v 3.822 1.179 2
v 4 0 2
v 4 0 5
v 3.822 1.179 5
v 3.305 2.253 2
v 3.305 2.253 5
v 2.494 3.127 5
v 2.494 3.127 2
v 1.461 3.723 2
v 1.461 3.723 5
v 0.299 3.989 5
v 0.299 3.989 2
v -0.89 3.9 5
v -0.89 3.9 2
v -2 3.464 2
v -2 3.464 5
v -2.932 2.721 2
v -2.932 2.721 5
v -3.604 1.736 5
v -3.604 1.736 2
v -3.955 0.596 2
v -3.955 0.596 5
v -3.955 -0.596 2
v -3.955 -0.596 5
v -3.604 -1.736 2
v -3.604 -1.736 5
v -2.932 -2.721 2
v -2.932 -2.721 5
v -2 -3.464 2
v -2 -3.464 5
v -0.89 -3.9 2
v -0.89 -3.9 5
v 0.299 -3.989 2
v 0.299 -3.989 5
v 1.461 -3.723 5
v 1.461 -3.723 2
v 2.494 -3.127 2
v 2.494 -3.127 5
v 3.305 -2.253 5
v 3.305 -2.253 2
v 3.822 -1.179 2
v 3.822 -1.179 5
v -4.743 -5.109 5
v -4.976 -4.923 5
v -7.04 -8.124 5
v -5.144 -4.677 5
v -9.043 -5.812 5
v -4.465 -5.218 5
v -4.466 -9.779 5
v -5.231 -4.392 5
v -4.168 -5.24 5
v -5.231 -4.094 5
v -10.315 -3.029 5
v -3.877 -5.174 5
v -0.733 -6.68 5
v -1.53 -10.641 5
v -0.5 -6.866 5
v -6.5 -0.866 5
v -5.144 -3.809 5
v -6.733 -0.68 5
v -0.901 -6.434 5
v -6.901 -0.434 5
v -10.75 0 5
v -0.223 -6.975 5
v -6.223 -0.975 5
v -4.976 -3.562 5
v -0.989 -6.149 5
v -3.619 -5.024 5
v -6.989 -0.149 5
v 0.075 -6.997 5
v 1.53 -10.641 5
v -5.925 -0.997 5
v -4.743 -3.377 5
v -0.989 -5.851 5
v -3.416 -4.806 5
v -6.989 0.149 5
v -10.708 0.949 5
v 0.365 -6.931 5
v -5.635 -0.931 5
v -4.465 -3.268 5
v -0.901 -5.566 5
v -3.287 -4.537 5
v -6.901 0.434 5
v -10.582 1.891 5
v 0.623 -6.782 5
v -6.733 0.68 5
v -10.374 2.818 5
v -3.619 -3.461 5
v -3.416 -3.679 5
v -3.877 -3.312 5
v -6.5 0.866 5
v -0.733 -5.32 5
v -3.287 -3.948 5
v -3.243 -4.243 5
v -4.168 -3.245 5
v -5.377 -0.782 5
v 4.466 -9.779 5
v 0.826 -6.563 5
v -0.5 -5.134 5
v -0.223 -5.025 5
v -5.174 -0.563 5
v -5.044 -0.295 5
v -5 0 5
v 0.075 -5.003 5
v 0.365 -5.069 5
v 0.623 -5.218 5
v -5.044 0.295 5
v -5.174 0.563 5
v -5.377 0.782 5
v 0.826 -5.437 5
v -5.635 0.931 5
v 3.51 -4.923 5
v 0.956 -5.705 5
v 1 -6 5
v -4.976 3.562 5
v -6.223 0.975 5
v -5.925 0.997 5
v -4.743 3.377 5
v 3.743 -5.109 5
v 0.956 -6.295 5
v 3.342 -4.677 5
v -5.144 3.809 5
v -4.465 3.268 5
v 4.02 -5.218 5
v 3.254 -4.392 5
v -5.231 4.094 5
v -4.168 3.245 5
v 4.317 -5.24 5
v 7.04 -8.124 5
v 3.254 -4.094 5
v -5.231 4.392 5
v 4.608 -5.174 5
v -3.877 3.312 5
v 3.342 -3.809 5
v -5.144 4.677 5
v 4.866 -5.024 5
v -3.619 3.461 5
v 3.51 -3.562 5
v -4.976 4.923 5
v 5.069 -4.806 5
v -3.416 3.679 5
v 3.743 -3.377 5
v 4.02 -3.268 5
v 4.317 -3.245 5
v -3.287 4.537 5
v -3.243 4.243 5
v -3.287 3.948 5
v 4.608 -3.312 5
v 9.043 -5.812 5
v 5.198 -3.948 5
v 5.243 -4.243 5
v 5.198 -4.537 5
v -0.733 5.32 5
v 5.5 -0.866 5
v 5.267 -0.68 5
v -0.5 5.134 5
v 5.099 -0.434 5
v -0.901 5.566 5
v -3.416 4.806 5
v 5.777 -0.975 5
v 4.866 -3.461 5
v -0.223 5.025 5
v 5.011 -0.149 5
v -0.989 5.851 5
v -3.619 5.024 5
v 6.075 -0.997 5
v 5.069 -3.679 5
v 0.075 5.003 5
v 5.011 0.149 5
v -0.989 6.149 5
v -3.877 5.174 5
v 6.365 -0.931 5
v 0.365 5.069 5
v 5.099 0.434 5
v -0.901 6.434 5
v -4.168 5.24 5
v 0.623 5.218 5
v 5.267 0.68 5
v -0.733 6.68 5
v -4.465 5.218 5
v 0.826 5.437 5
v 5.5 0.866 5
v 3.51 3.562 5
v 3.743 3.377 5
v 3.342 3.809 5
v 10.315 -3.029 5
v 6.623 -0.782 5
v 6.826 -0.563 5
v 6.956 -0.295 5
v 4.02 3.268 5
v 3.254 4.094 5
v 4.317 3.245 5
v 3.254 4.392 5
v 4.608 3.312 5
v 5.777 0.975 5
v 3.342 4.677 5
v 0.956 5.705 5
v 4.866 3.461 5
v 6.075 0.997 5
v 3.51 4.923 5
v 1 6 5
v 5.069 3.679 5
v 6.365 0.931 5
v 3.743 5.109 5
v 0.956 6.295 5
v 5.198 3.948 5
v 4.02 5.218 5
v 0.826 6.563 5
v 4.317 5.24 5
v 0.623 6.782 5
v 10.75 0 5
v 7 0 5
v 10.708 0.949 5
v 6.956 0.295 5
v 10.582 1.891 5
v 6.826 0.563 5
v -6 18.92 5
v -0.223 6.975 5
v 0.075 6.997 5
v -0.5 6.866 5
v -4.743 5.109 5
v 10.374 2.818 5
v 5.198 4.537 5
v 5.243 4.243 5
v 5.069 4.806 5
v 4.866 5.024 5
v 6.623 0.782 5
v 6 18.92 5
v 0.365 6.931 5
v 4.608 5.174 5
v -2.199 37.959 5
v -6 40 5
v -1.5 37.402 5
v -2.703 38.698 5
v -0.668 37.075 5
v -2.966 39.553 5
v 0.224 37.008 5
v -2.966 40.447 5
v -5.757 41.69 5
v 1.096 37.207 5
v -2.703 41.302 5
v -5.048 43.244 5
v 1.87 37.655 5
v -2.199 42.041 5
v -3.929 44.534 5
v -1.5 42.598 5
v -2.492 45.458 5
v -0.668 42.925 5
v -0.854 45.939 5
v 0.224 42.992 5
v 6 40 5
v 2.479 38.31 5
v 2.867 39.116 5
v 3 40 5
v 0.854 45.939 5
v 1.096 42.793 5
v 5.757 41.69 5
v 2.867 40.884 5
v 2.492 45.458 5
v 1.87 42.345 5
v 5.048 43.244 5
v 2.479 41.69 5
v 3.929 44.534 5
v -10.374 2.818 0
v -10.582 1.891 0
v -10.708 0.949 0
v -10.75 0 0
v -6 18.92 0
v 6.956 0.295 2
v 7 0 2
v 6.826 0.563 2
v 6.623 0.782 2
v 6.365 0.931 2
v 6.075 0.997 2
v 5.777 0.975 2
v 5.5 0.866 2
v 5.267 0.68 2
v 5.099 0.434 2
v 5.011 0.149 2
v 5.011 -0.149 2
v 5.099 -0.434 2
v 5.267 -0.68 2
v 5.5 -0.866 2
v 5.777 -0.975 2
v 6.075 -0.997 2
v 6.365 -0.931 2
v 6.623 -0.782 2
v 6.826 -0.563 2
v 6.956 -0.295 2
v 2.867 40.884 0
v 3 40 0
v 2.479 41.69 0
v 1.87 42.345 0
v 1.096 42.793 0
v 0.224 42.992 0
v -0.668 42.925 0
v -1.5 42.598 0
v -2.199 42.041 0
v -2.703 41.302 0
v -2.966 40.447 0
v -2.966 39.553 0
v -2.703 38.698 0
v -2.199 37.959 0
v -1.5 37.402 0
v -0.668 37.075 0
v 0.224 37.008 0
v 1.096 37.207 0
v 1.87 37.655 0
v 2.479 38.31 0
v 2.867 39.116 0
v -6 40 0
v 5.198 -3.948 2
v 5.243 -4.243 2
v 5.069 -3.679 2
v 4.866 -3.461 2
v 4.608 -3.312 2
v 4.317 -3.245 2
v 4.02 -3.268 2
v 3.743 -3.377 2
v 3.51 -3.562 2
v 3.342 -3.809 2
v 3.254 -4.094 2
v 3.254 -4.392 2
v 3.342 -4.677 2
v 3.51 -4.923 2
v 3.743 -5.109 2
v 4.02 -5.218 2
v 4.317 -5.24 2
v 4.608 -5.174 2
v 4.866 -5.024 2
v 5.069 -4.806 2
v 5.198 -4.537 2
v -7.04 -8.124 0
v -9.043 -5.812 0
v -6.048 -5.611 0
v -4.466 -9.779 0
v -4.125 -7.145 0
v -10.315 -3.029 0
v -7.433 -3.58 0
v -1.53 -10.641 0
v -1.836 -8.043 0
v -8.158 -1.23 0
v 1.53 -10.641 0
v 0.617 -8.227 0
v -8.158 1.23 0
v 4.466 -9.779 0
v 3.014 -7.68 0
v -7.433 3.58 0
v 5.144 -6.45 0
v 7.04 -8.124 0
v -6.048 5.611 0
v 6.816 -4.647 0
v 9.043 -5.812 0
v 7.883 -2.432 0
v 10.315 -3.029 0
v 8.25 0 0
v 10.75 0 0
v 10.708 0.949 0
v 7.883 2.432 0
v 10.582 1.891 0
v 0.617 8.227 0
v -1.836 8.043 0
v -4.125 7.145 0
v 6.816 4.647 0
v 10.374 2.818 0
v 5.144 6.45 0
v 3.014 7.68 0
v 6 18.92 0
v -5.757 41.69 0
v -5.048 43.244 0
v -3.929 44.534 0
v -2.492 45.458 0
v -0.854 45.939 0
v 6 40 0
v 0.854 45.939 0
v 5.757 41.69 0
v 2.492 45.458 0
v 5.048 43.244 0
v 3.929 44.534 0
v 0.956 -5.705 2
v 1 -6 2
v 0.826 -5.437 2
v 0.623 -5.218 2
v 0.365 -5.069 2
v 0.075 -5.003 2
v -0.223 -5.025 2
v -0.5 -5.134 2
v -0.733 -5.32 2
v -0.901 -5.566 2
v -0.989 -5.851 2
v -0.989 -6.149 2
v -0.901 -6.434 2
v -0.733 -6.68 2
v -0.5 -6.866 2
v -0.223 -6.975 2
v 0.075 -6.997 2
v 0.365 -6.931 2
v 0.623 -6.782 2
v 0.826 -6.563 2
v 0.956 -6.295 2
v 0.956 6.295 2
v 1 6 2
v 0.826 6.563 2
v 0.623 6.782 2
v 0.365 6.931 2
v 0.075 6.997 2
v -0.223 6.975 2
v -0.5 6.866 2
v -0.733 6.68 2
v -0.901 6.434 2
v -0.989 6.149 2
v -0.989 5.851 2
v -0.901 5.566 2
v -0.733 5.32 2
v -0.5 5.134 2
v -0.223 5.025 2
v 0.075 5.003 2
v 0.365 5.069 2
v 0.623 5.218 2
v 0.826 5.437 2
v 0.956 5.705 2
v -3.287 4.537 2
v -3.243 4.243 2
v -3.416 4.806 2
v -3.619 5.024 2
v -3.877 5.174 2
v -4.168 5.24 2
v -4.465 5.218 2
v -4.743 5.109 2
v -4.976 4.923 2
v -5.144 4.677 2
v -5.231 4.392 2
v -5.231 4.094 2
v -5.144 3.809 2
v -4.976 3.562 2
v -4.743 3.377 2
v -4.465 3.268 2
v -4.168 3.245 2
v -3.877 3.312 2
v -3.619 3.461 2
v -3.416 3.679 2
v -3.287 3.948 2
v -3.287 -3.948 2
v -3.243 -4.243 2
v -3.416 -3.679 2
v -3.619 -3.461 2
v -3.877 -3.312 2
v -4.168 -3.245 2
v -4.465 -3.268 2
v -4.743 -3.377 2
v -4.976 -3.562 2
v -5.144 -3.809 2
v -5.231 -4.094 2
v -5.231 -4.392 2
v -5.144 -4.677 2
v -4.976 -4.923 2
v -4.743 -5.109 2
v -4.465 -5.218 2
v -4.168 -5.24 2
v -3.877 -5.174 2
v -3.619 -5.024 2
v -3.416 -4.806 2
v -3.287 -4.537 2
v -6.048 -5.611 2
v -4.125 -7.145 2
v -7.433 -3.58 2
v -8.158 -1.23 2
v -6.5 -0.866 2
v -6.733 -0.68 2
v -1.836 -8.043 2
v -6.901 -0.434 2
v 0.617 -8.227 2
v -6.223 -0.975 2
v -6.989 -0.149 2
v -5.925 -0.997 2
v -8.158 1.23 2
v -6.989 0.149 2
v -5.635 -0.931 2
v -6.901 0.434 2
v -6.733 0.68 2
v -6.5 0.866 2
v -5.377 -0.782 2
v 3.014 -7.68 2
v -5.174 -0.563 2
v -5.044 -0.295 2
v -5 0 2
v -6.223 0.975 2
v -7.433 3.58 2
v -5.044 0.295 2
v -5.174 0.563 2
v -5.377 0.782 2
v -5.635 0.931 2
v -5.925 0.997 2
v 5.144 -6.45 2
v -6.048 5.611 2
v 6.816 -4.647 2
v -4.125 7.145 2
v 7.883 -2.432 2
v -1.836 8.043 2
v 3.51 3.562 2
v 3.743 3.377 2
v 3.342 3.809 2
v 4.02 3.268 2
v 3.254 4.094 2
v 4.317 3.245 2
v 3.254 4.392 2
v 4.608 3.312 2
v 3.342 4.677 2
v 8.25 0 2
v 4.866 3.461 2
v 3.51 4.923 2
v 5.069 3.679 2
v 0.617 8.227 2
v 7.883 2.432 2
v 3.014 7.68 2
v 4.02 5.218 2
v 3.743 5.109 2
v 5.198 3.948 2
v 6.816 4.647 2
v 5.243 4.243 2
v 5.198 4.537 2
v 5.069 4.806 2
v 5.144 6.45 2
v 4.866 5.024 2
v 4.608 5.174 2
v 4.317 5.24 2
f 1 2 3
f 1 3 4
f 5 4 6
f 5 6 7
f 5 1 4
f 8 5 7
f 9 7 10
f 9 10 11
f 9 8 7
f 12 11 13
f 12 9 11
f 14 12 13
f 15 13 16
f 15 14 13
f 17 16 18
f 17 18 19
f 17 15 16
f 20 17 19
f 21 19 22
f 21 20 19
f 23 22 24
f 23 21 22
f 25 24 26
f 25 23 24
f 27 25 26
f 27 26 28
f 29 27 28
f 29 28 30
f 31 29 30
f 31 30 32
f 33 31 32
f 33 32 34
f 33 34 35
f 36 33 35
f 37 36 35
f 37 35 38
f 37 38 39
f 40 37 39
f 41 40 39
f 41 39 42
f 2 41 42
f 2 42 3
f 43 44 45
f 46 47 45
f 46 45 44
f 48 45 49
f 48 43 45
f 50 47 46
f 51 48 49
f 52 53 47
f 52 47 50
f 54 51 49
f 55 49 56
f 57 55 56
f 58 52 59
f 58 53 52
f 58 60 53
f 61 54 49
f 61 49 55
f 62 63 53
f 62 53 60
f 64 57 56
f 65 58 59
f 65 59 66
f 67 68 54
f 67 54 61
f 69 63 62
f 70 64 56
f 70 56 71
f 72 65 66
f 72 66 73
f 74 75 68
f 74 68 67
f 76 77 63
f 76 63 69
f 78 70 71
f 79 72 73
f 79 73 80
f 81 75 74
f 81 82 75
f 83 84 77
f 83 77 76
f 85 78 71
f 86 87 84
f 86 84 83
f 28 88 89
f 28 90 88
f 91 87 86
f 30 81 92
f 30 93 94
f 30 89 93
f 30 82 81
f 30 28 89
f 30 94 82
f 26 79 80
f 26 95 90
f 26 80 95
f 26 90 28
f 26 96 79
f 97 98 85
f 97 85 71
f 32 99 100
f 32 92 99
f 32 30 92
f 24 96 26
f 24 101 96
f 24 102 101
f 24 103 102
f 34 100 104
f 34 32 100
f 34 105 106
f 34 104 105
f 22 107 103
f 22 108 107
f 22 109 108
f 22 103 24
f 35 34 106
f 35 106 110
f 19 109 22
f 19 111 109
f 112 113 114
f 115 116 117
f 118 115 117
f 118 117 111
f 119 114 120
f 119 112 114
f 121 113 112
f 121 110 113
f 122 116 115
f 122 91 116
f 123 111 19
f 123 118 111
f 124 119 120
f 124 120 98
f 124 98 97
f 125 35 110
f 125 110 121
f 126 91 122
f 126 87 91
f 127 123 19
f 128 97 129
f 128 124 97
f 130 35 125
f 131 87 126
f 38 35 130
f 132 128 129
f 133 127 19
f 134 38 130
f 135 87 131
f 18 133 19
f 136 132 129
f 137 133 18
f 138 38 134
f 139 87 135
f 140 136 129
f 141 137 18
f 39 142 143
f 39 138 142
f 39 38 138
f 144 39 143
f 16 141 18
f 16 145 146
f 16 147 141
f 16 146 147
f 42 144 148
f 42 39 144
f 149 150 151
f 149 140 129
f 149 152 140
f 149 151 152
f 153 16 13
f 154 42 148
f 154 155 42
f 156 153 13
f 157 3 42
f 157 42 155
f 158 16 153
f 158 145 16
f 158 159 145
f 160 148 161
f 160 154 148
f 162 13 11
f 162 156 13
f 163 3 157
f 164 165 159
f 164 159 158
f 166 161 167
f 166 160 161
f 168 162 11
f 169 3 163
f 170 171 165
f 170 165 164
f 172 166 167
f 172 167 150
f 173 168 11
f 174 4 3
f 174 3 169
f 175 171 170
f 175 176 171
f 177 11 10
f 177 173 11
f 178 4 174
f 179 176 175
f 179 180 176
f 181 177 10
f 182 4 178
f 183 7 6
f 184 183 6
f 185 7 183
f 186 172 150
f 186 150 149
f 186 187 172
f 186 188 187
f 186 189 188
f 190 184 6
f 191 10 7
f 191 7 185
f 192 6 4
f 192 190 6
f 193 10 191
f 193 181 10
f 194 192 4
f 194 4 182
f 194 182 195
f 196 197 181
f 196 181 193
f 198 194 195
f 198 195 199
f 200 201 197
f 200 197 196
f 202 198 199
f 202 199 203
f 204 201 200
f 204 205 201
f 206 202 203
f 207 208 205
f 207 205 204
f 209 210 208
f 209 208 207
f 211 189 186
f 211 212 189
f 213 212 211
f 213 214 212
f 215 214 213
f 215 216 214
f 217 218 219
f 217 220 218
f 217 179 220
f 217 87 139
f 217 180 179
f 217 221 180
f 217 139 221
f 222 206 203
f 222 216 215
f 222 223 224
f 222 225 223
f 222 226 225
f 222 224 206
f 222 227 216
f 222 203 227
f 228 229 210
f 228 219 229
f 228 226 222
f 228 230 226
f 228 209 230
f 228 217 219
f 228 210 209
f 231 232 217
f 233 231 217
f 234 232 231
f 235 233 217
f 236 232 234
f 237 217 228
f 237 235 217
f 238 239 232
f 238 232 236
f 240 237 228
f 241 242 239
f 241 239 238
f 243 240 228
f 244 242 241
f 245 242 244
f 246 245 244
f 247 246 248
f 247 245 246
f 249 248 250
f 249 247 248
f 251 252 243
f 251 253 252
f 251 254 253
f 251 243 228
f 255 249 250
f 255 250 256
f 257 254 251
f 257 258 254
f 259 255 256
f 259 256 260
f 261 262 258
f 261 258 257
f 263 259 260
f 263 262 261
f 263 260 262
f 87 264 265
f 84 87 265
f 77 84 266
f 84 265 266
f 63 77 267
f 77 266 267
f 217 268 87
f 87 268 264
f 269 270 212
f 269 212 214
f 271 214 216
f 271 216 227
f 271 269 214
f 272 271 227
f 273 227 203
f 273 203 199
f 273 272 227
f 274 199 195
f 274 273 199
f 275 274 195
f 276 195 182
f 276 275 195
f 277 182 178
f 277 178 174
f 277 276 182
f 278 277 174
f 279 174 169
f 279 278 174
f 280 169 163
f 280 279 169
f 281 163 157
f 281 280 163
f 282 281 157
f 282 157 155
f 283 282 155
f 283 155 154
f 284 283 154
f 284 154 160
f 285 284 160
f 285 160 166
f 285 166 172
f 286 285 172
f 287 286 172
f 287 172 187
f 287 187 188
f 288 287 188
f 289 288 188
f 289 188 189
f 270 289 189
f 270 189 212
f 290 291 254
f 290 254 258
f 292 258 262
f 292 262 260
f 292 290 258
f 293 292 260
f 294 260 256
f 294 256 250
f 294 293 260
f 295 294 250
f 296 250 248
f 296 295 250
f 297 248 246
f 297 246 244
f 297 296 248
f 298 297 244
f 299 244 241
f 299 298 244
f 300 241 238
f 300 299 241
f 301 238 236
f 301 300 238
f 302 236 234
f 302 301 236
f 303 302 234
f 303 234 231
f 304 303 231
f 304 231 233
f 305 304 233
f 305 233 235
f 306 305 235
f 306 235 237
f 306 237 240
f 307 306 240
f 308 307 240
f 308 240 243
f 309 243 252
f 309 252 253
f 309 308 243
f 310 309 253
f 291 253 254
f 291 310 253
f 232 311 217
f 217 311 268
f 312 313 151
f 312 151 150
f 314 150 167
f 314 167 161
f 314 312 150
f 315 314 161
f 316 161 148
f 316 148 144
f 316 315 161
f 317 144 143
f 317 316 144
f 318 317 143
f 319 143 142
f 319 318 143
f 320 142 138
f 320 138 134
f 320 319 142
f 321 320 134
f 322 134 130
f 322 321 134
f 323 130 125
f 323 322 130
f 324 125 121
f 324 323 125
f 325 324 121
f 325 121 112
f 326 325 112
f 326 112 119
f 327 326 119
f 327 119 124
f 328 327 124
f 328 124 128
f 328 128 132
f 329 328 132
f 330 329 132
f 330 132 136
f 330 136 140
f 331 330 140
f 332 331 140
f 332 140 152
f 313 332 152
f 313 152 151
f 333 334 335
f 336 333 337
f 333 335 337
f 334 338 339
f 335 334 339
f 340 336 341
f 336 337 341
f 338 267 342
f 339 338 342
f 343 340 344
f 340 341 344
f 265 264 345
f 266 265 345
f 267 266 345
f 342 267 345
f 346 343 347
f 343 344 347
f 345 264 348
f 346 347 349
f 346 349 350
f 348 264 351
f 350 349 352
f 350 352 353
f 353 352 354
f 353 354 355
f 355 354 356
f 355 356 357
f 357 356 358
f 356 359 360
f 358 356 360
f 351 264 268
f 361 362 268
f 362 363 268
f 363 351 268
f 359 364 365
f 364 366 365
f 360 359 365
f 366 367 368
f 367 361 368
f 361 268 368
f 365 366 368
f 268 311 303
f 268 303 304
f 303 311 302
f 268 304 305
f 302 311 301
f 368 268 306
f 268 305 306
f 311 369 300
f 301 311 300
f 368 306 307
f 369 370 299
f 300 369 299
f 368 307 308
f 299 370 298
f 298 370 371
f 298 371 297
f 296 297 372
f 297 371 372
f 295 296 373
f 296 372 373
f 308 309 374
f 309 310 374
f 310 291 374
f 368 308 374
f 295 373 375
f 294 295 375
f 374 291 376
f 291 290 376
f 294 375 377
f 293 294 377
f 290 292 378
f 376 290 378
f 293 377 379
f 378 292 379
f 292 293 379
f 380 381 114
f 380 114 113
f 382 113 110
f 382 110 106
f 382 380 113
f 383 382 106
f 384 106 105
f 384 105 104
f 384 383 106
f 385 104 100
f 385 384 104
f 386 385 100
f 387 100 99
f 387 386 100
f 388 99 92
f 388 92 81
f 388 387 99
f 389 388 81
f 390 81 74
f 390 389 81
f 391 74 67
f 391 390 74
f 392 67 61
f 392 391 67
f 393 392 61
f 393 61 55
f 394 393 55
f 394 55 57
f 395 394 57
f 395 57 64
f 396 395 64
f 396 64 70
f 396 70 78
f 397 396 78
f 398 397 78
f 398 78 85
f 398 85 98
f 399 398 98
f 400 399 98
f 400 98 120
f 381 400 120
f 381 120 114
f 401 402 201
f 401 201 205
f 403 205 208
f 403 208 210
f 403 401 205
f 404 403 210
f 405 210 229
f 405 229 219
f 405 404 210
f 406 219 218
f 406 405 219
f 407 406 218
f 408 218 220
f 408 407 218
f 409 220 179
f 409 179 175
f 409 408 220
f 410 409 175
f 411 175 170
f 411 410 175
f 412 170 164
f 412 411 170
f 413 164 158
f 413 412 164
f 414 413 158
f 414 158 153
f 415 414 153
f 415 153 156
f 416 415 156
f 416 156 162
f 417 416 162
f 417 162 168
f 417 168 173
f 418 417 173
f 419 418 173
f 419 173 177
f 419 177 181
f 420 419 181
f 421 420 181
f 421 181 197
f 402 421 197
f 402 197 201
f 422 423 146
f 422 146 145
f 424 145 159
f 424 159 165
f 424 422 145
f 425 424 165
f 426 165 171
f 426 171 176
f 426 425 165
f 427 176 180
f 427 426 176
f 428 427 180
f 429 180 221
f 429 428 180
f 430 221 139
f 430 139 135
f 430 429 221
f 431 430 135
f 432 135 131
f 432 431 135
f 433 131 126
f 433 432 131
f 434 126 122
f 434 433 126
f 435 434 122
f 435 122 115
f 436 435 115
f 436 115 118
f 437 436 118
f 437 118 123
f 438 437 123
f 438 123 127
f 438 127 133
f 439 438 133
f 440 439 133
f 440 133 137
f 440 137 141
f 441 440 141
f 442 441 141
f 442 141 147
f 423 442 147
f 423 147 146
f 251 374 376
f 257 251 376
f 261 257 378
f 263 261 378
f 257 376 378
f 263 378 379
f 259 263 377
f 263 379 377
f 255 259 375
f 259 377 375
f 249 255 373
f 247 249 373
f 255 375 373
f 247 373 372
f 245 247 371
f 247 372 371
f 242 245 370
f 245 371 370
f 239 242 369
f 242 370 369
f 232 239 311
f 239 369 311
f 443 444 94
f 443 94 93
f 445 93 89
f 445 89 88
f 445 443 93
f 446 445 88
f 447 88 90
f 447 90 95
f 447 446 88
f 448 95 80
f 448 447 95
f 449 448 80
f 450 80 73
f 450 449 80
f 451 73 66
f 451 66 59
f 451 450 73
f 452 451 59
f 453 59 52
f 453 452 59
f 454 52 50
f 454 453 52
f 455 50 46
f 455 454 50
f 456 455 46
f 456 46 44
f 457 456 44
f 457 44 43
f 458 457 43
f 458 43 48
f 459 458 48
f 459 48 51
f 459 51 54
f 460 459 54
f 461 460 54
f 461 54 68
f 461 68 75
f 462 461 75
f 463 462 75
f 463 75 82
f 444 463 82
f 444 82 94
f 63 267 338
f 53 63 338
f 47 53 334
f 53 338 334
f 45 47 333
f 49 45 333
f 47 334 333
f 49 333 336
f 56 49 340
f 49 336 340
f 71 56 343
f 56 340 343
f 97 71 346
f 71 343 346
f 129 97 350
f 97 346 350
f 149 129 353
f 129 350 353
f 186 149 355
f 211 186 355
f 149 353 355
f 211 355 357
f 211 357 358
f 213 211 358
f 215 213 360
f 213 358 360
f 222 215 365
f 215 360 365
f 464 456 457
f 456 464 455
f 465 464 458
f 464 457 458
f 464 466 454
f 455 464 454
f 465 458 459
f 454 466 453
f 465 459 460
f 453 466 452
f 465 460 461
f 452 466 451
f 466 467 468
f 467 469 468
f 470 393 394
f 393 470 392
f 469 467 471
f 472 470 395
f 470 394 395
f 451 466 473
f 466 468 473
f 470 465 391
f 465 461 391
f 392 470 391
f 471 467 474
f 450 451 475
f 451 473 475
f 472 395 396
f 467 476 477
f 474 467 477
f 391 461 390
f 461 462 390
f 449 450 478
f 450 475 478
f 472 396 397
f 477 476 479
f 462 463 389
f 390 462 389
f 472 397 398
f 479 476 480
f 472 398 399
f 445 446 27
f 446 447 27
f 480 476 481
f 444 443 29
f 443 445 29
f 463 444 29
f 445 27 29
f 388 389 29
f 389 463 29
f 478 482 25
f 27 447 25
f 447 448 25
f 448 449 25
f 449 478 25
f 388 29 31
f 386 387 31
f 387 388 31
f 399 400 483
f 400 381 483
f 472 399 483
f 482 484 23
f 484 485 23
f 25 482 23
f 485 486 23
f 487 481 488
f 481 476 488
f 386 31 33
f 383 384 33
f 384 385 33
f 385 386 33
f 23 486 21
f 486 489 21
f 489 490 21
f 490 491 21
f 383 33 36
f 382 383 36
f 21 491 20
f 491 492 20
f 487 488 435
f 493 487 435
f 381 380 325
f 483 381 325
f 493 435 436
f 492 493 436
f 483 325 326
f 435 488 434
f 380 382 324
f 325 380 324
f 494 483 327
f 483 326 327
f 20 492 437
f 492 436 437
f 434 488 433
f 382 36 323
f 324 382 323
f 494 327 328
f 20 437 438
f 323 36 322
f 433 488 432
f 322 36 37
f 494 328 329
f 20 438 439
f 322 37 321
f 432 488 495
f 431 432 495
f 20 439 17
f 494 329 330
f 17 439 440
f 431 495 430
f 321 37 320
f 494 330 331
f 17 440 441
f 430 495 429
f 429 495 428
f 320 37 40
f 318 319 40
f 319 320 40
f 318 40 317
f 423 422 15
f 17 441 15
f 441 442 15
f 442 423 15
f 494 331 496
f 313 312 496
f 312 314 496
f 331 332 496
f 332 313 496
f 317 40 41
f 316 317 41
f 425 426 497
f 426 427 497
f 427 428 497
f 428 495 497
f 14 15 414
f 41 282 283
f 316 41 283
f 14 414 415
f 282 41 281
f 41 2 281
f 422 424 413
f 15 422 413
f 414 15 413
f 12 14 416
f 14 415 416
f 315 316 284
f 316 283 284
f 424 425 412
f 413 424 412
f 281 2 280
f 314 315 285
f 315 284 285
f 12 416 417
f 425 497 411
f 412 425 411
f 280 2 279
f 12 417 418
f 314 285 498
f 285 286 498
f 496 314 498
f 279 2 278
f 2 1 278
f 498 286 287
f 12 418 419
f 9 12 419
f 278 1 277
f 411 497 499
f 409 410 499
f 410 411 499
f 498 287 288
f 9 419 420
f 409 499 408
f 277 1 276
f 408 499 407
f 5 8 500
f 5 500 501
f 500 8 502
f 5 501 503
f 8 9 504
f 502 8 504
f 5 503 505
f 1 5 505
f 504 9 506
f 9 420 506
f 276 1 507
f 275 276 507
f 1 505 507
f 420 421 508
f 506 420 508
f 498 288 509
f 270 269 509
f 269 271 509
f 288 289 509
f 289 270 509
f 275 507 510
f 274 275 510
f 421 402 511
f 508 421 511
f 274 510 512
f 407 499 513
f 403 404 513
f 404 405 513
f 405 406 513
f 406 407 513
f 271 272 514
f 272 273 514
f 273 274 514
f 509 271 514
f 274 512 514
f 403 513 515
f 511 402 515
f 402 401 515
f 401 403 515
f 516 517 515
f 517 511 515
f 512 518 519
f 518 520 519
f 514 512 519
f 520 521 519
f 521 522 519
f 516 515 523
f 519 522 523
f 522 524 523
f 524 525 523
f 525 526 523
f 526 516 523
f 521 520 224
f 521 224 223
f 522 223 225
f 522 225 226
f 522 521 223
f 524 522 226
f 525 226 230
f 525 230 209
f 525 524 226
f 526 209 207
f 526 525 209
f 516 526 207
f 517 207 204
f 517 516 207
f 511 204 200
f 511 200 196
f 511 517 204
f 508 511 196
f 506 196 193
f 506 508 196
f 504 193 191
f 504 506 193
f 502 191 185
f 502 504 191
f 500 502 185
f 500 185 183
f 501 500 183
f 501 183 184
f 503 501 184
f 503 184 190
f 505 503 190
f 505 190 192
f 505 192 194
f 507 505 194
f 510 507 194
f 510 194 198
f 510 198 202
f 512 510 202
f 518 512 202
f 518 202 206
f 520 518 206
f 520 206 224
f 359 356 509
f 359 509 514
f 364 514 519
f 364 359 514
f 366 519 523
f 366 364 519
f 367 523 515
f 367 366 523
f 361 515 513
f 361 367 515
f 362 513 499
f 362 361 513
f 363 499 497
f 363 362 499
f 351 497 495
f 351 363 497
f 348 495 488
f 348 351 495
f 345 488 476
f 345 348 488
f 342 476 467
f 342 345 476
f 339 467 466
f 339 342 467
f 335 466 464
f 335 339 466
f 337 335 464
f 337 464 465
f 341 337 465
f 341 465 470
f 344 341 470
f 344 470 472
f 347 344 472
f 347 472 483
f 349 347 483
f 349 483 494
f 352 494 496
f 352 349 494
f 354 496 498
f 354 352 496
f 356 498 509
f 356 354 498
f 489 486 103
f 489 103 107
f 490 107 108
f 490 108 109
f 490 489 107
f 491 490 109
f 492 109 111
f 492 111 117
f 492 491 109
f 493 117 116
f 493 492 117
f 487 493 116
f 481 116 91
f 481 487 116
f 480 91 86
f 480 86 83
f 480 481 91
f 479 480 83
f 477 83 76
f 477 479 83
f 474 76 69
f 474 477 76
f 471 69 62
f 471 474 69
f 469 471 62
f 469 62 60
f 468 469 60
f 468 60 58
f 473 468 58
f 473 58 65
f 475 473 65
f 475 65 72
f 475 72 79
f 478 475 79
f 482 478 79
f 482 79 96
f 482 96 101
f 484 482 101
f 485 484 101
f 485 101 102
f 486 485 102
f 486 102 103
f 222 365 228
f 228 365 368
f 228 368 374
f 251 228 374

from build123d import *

# Parameters (mm, degrees)
F0_R     = 8.25
F0_R_2   = 3
F0_R_3   = 1
F0_R_4   = 4
F1_DEPTH = 5
F2_DEPTH = 2


with BuildPart() as f1:
    # F0 (on Top) → F1 (new body)
    with BuildSketch(Plane.XY):
        with BuildLine():
            Line((-6, 18.919781), (-6, 8.919781))
            ThreePointArc((-6, 8.919781), (-8.736982, 6.263198), (-10.374039, 2.818123))
            ThreePointArc((-10.374039, 2.818123), (-10.655595, 1.421545), (-10.75, 0))
            ThreePointArc((-10.75, 0), (0, -10.75), (10.75, 0))
            ThreePointArc((10.75, 0), (10.655595, 1.421545), (10.374039, 2.818123))
            ThreePointArc((10.374039, 2.818123), (8.736982, 6.263198), (6, 8.919781))
            Line((6, 8.919781), (6, 18.919781))
            Line((6, 18.919781), (6, 40))
            ThreePointArc((6, 40), (0, 46), (-6, 40))
            Line((-6, 40), (-6, 18.919781))
        make_face()
        Circle(F0_R, mode=Mode.SUBTRACT)
        with Locations((0, 40)):
            Circle(F0_R_2, mode=Mode.SUBTRACT)
        Circle(F0_R)
        with Locations((-6, 0)):
            Circle(F0_R_3, mode=Mode.SUBTRACT)
        with Locations((-4.242641, -4.242641)):
            Circle(F0_R_3, mode=Mode.SUBTRACT)
        with Locations((-4.242641, 4.242641)):
            Circle(F0_R_3, mode=Mode.SUBTRACT)
        with Locations((0, -6)):
            Circle(F0_R_3, mode=Mode.SUBTRACT)
        with Locations((4.242641, -4.242641)):
            Circle(F0_R_3, mode=Mode.SUBTRACT)
        Circle(F0_R_4, mode=Mode.SUBTRACT)
        with Locations((4.242641, 4.242641)):
            Circle(F0_R_3, mode=Mode.SUBTRACT)
        with Locations((6, 0)):
            Circle(F0_R_3, mode=Mode.SUBTRACT)
        with Locations((0, 6)):
            Circle(F0_R_3, mode=Mode.SUBTRACT)
        with BuildLine():
            ThreePointArc((-10.374039, 2.818123), (-8.736982, 6.263198), (-6, 8.919781))
            Line((-6, 8.919781), (-6, 18.919781))
            Line((-6, 18.919781), (-10.374039, 2.818123))
        make_face()
        with BuildLine():
            ThreePointArc((6, 8.919781), (8.736982, 6.263198), (10.374039, 2.818123))
            Line((10.374039, 2.818123), (6, 18.919781))
            Line((6, 18.919781), (6, 8.919781))
        make_face()
    extrude(amount=F1_DEPTH)

    # F0 (on Top) → F2 (cut)
    with BuildSketch(Plane.XY):
        Circle(F0_R)
        with Locations((-6, 0)):
            Circle(F0_R_3, mode=Mode.SUBTRACT)
        with Locations((-4.242641, -4.242641)):
            Circle(F0_R_3, mode=Mode.SUBTRACT)
        with Locations((-4.242641, 4.242641)):
            Circle(F0_R_3, mode=Mode.SUBTRACT)
        with Locations((0, -6)):
            Circle(F0_R_3, mode=Mode.SUBTRACT)
        with Locations((4.242641, -4.242641)):
            Circle(F0_R_3, mode=Mode.SUBTRACT)
        Circle(F0_R_4, mode=Mode.SUBTRACT)
        with Locations((4.242641, 4.242641)):
            Circle(F0_R_3, mode=Mode.SUBTRACT)
        with Locations((6, 0)):
            Circle(F0_R_3, mode=Mode.SUBTRACT)
        with Locations((0, 6)):
            Circle(F0_R_3, mode=Mode.SUBTRACT)
    extrude(amount=F2_DEPTH, mode=Mode.SUBTRACT)


solid = f1.part
